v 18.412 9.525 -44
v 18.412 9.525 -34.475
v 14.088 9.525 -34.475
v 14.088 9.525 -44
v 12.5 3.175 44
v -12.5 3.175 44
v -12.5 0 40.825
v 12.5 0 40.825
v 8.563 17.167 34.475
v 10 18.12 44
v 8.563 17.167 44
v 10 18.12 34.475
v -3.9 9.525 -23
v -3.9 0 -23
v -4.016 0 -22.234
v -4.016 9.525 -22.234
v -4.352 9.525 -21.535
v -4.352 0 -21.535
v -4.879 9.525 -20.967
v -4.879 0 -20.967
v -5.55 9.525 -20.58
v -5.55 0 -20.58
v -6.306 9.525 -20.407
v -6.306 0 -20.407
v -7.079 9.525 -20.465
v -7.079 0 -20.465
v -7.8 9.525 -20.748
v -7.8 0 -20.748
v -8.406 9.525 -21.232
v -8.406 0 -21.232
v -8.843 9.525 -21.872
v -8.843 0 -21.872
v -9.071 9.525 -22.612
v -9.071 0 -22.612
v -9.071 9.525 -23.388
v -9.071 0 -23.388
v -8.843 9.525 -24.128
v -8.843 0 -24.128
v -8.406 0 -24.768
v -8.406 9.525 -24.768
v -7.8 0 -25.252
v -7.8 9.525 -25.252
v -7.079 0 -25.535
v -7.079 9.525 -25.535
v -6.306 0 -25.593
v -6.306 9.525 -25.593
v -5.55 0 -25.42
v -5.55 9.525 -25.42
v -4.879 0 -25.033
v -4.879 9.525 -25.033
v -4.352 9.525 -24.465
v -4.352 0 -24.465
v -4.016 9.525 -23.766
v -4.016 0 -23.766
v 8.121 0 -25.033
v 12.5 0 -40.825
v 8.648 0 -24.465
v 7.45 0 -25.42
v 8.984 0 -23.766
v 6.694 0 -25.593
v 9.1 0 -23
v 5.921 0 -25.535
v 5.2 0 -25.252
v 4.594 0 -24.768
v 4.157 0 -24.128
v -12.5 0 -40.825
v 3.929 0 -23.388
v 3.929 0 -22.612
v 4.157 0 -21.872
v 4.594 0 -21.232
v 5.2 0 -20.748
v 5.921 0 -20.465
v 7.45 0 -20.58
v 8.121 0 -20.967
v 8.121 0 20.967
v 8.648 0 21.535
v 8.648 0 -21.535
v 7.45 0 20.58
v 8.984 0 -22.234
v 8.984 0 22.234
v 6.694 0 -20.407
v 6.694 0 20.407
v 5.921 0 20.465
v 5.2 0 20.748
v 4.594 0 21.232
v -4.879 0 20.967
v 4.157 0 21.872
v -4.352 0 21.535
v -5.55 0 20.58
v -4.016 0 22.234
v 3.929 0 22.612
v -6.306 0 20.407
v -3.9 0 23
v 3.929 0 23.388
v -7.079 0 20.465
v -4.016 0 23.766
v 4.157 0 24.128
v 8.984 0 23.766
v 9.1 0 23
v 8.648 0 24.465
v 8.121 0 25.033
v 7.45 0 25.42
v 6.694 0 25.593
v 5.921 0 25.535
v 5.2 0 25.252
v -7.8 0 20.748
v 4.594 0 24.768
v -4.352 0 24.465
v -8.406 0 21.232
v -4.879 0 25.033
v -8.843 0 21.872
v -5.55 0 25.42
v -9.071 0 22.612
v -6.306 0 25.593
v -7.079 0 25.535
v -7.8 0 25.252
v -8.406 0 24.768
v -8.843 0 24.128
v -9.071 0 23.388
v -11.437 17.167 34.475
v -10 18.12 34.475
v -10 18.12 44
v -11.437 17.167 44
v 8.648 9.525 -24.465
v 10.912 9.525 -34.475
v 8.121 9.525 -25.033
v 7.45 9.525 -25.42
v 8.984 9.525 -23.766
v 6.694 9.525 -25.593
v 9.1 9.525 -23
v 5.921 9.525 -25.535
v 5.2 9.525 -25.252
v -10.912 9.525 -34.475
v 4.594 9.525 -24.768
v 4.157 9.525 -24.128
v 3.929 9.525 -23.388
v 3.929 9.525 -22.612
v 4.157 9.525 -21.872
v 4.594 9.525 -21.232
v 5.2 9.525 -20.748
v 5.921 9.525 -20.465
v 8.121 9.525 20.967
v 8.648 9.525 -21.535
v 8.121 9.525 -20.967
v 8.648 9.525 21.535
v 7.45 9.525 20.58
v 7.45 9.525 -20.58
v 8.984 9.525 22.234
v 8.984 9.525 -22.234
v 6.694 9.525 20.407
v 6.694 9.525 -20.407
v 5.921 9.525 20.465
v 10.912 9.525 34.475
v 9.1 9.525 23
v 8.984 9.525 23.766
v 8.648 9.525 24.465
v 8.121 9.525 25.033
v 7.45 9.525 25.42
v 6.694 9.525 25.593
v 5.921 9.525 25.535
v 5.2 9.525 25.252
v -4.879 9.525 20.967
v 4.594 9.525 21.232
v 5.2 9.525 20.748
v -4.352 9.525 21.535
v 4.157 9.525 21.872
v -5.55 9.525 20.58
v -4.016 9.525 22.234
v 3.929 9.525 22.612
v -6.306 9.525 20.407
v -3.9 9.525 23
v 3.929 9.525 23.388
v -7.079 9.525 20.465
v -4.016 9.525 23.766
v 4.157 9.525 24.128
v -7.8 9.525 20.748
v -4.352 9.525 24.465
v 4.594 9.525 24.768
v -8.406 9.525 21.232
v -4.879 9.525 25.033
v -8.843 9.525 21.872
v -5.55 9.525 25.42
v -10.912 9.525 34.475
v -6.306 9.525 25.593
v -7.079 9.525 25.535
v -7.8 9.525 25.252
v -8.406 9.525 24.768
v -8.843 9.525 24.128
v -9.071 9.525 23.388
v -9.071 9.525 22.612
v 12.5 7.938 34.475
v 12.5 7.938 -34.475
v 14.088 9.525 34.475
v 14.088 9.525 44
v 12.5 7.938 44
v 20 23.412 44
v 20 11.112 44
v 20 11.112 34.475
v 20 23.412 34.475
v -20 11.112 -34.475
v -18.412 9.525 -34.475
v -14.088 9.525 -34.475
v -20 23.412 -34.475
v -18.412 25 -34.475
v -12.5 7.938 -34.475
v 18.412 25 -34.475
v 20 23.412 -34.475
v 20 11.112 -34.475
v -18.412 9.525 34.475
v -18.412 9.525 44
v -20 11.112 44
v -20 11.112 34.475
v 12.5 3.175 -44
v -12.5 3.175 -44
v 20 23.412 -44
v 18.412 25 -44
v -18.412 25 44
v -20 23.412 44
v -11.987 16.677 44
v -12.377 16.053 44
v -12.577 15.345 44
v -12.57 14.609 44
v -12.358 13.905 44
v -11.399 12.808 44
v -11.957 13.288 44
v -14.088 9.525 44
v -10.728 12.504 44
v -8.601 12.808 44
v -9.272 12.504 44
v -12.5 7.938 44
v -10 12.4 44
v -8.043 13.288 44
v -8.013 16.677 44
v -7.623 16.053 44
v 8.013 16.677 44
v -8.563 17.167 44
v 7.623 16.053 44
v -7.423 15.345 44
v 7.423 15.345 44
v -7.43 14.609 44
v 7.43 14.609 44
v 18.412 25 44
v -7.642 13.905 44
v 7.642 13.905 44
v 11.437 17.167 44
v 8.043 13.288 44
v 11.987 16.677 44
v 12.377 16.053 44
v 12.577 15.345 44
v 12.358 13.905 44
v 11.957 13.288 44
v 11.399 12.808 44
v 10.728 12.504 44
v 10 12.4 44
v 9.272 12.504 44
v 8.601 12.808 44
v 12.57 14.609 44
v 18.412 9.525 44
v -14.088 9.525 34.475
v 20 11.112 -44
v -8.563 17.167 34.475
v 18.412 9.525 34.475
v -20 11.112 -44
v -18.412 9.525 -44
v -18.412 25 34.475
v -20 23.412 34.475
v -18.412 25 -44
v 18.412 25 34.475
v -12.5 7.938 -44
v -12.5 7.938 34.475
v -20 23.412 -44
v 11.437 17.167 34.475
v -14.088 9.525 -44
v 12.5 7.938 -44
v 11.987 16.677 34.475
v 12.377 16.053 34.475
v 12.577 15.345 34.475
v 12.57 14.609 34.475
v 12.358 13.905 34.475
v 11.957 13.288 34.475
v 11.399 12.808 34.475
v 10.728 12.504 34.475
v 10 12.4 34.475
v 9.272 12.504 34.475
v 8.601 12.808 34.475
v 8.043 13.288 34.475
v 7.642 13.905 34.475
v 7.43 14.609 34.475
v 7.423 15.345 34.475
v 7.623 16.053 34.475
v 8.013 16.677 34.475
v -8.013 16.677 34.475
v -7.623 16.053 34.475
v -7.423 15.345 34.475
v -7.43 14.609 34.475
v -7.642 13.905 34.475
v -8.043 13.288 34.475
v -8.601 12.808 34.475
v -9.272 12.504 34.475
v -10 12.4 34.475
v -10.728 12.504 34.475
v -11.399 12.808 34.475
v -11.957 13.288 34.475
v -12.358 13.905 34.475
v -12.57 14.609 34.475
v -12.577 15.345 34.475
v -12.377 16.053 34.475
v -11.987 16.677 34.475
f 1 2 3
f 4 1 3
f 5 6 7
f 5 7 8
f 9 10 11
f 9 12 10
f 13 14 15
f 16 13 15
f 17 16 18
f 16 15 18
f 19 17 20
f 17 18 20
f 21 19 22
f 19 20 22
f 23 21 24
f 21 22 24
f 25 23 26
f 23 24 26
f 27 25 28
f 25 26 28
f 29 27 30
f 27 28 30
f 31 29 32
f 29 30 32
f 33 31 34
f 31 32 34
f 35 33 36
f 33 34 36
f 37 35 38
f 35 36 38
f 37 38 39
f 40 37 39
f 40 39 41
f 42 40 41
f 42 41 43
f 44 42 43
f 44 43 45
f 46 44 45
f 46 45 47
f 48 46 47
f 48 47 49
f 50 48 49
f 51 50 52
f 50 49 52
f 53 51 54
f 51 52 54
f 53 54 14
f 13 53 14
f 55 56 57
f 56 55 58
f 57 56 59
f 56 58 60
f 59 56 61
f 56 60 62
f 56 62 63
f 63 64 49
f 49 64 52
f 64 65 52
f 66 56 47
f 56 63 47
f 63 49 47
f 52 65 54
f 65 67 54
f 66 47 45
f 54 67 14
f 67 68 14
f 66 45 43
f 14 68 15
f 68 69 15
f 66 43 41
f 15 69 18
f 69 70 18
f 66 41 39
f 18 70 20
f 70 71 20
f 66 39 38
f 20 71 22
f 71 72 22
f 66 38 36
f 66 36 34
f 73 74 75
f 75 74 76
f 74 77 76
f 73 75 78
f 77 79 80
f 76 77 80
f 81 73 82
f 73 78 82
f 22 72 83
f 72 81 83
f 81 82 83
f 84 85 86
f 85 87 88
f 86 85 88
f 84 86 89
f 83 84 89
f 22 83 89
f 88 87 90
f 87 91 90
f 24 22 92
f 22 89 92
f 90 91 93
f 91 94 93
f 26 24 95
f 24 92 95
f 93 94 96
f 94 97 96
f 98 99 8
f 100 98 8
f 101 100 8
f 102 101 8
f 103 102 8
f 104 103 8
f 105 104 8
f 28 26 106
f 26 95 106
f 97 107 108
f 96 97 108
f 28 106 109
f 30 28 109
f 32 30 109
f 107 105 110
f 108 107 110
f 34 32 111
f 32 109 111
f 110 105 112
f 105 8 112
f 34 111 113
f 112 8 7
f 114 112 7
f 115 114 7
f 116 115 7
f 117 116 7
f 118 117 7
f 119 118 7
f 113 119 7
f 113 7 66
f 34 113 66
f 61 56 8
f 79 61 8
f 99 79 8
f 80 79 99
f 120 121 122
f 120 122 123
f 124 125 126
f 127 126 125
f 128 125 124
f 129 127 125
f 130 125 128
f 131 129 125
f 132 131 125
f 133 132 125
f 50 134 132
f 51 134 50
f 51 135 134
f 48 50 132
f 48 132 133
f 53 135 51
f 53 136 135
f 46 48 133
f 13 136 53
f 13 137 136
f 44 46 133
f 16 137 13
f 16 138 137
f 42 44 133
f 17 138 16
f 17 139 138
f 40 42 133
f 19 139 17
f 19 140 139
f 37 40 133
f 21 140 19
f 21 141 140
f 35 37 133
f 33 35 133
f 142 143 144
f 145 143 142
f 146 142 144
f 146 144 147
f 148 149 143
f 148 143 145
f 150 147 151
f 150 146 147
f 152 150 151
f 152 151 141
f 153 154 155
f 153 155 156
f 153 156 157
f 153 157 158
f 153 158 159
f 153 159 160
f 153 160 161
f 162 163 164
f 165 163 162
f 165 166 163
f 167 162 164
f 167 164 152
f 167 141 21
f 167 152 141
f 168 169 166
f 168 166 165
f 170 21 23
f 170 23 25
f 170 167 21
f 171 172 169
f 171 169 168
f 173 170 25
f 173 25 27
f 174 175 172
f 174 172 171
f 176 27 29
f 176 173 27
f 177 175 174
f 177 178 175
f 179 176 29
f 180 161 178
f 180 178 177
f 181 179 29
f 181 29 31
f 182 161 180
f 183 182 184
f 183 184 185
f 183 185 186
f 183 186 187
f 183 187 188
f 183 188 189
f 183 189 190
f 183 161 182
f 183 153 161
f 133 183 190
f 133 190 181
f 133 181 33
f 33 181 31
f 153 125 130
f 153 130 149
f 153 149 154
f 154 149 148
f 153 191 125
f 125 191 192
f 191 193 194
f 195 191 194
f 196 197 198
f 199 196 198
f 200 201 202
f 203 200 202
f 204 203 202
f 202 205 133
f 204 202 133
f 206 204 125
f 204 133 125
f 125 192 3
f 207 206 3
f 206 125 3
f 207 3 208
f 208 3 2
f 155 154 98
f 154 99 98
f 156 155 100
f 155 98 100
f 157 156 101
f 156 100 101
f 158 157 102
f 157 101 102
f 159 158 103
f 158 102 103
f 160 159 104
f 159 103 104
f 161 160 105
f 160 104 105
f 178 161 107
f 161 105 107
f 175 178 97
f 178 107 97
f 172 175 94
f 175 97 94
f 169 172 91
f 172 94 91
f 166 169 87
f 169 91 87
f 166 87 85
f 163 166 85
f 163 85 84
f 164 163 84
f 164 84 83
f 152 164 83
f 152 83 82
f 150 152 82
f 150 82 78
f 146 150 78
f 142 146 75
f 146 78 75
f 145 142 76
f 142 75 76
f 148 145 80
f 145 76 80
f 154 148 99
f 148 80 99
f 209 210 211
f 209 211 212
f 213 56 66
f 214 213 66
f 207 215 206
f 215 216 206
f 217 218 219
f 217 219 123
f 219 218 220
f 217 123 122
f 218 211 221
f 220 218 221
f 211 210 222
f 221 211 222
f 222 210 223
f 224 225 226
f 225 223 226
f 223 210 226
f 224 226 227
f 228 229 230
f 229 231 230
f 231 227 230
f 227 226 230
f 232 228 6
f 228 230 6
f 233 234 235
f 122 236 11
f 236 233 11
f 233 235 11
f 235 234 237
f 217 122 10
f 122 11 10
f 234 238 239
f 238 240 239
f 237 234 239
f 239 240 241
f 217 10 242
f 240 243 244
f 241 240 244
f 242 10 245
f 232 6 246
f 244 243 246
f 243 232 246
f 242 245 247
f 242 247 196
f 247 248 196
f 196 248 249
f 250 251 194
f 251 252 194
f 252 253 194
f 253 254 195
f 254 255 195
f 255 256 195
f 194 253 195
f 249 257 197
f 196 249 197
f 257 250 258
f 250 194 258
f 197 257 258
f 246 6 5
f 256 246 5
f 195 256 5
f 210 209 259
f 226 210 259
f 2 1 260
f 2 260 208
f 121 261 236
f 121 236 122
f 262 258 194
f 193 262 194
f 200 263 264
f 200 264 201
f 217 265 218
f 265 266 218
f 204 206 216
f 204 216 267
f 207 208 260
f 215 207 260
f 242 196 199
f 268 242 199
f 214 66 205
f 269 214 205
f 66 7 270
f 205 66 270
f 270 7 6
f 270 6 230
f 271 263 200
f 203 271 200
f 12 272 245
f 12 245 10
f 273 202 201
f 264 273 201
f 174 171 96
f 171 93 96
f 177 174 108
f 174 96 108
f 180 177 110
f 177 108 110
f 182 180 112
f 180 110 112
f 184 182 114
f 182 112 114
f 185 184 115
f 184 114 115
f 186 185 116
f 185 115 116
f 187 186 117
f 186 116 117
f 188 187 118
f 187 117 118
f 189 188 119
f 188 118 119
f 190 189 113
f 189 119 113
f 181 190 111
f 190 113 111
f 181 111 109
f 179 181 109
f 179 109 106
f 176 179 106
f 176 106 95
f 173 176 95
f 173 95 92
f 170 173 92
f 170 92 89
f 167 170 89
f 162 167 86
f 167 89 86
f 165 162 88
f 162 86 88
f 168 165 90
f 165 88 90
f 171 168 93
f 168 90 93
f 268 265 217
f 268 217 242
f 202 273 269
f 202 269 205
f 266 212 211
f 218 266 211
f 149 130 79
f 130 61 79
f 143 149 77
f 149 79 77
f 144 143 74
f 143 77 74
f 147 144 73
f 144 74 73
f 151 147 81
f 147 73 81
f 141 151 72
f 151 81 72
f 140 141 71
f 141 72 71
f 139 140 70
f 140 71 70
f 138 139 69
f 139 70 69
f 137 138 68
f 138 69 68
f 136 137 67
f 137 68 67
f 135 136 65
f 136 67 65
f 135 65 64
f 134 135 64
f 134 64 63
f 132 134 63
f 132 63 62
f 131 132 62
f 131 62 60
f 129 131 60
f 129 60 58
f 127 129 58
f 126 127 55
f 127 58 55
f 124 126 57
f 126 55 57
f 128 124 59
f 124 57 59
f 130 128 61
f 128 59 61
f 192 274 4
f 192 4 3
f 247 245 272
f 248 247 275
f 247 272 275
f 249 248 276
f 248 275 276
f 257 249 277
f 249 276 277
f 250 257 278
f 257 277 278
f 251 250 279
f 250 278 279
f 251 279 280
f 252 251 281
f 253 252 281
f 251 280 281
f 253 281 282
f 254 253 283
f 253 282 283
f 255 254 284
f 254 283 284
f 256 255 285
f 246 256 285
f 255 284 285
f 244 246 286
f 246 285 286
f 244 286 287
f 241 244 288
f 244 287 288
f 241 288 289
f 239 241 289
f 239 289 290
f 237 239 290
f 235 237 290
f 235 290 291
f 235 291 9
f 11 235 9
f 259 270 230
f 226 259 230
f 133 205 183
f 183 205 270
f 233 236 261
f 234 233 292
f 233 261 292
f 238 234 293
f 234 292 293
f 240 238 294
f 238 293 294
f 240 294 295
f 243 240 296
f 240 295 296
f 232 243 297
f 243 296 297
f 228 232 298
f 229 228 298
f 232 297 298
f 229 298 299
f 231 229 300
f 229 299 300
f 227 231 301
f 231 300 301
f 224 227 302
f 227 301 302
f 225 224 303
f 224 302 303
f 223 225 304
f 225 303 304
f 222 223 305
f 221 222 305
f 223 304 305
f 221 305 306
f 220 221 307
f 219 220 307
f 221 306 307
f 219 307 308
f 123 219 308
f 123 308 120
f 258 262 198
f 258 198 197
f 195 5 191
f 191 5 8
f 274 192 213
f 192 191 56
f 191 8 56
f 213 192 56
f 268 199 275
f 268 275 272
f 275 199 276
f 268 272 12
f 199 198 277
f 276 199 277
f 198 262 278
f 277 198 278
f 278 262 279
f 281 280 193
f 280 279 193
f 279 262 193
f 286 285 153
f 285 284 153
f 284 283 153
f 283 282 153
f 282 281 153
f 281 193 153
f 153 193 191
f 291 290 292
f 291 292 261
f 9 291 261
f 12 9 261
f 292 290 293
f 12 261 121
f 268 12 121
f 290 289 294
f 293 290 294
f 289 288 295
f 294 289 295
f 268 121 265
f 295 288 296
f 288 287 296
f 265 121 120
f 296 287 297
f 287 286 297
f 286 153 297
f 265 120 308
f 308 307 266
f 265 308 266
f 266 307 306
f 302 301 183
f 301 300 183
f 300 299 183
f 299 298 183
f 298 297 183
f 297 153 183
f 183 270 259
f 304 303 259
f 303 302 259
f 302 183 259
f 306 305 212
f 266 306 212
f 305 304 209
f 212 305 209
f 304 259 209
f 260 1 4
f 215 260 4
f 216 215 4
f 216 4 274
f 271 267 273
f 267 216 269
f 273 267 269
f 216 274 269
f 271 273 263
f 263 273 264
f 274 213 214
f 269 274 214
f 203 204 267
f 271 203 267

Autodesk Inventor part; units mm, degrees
ref_plane "YZ Plane" through (0, 0, 0) normal (1, 0, 0) x (0, 1, 0)
ref_plane "XZ Plane" through (0, 0, 0) normal (0, 1, 0) x (-1, 0, 0)
sketch "Sketch1" plane through (0, 0, 0) normal (0, 1, 0) x (-1, 0, 0)
  line L0 (-12.5, -44) -> (12.5, -44)
  line L1 (12.5, -44) -> (12.5, 44)
  line L2 (12.5, 44) -> (-12.5, 44)
  line L3 (-12.5, 44) -> (-12.5, -44)
  line L4 (-12.5, -44) -> (12.5, 44) construction
  line L5 (12.5, -44) -> (-12.5, 44) construction
  point P0 (0, 0)
  dimension "d0" = 88
  dimension "d1" = 25
extrude "Extrusion1" add sketch "Sketch1" along normal blind 9.525
sketch "Sketch2" plane through (0, 9.525, 0) normal (0, 1, 0) x (1, 0, 0)
  line L0 (20, -34.475) -> (-20, -34.475)
  line L1 (-20, -34.475) -> (-20, -44)
  line L2 (-20, -44) -> (20, -44)
  line L3 (20, -44) -> (20, -34.475)
  line L4 (20, -34.475) -> (-20, -44) construction
  line L5 (-20, -34.475) -> (20, -44) construction
  line L6 (-12.5, -44) -> (12.5, -44) projected
  point P0 (0, 0)
  point P1 (0, -39.2375)
  dimension "d4" = 40
  dimension "d5" = 9.525
extrude "Extrusion2" add sketch "Sketch2" along normal blind 15.475
fillet "Fillet1" radius 3.175 6 edges at (-12.5, 9.525, 39.2375) (-20, 9.525, 39.2375) (-20, 25, 39.2375) (20, 9.525, 39.2375) (20, 25, 39.2375) (12.5, 9.525, 39.2375)
ref_plane "Work Plane1" through (-16.825, 25, 0) normal (0, 0, 1) x (1, 0, 0)
mirror "Mirror1" about plane through (-16.825, 25, 0) normal (0, 0, 1) of "Extrusion2", "Fillet1"
sketch "Sketch3" plane through (16.825, 25, -44) normal (0, 0, -1) x (-1, 0, 0)
  line L0 (29.325, -25) -> (29.325, -18.65) projected
  arc A0 (32.5, -15.475) -> (29.325, -18.65) centre (32.5, -18.65) ccw projected
  line L1 (33.65, -15.475) -> (32.5, -15.475) projected
  arc A1 (33.65, -15.475) -> (36.825, -12.3) centre (33.65, -12.3) ccw projected
  line L2 (36.825, -12.3) -> (36.825, -3.175) projected
  arc A2 (36.825, -3.175) -> (33.65, 0) centre (33.65, -3.175) ccw projected
  line L3 (33.65, 0) -> (0, 0) projected
  arc A3 (0, 0) -> (-3.175, -3.175) centre (0, -3.175) ccw projected
  line L4 (-3.175, -12.3) -> (-3.175, -3.175) projected
  arc A4 (-3.175, -12.3) -> (0, -15.475) centre (0, -12.3) ccw projected
  line L5 (1.15, -15.475) -> (0, -15.475) projected
  arc A5 (4.325, -18.65) -> (1.15, -15.475) centre (1.15, -18.65) ccw projected
  line L6 (4.325, -25) -> (4.325, -18.65) projected
  circle A6 centre (26.825, -10) radius 2.6
  circle A7 centre (6.825, -10) radius 2.6
  line L7 (4.325, -25) -> (29.325, -25) projected
  point P0 (16.825, -25)
  dimension "d10" = 5.2
  dimension "d11" = 10
  dimension "d12" = 10
  dimension "d13" = 10
extrude "Extrusion3" cut sketch "Sketch3" against normal through all contours A6 | A7
sketch "Sketch4" plane through (0, 0, 0) normal (0, -1, 0) x (1, 0, 0)
  line L0 (-6.5, -23) -> (6.5, -23) construction
  line L1 (6.5, -23) -> (6.5, 23) construction
  line L2 (6.5, 23) -> (-6.5, 23) construction
  line L3 (-6.5, 23) -> (-6.5, -23) construction
  line L4 (-6.5, -23) -> (6.5, 23) construction
  line L5 (6.5, -23) -> (-6.5, 23) construction
  circle A0 centre (6.5, 23) radius 2.6
  circle A1 centre (6.5, -23) radius 2.6
  circle A2 centre (-6.5, -23) radius 2.6
  circle A3 centre (-6.5, 23) radius 2.6
  point P0 (0, 0)
  dimension "d16" = 5.2
  dimension "d17" = 46
  dimension "d18" = 13
extrude "Extrusion4" cut sketch "Sketch4" against normal through all
sketch "Sketch5" plane through (16.825, 25, -44) normal (0, 0, -1) x (-1, 0, 0)
  circle A0 centre (6.825, -10) radius 2.6 projected
  circle A1 centre (26.825, -10) radius 2.6 projected
  line L0 (5.3878, -7.8333) -> (6.825, -6.88)
  line L1 (6.825, -6.88) -> (8.2622, -7.8333)
  line L2 (25.3878, -7.8333) -> (26.825, -6.88)
  line L3 (26.825, -6.88) -> (28.2622, -7.8333)
  point P0 (16.825, -25)
  point P1 (6.825, -7.4)
  point P2 (26.825, -7.4)
  dimension "d21" = 0.52
  dimension "d22" = 5.2
  dimension "d23" = 0.52
extrude "Extrusion5" cut sketch "Sketch5" against normal through all contours A0 L0 L1 | A1 L2 L3
sketch "Sketch6" plane through (0, 9.525, 0) normal (0, 1, 0) x (1, 0, 0)
  circle A0 centre (-6.5, 23) radius 2.6 projected
  circle A1 centre (6.5, 23) radius 2.6 projected
  circle A2 centre (-6.5, -23) radius 2.6 projected
  circle A3 centre (6.5, -23) radius 2.6 projected
  circle A4 centre (-6.5, 23) radius 5
  circle A5 centre (6.5, 23) radius 5
  circle A6 centre (-6.5, -23) radius 5
  circle A7 centre (6.5, -23) radius 5
  point P0 (0, 0)
  dimension "d26" = 10
extrude "Extrusion6" add sketch "Sketch6" against normal up to surface (9.525 mm away)
chamfer "Chamfer1" distance 3.175 angle 45 2 edges at (0, 0, -44) (0, 0, 44)
sketch "Sketch7" plane through (-16.825, 25, 44) normal (0, 0, 1) x (1, 0, 0)
  line L0 (29.325, -21.825) -> (4.325, -21.825) projected
  line L1 (29.325, -21.825) -> (29.325, -18.65) projected
  arc A0 (32.5, -15.475) -> (29.325, -18.65) centre (32.5, -18.65) ccw projected
  line L2 (32.5, -15.475) -> (33.65, -15.475) projected
  arc A1 (33.65, -15.475) -> (36.825, -12.3) centre (33.65, -12.3) ccw projected
  line L3 (36.825, -12.3) -> (36.825, -3.175) projected
  arc A2 (36.825, -3.175) -> (33.65, 0) centre (33.65, -3.175) ccw projected
  line L4 (0, 0) -> (33.65, 0) projected
  arc A3 (0, 0) -> (-3.175, -3.175) centre (0, -3.175) ccw projected
  line L5 (-3.175, -12.3) -> (-3.175, -3.175) projected
  arc A4 (-3.175, -12.3) -> (0, -15.475) centre (0, -12.3) ccw projected
  line L6 (0, -15.475) -> (1.15, -15.475) projected
  arc A5 (4.325, -18.65) -> (1.15, -15.475) centre (1.15, -18.65) ccw projected
  line L7 (4.325, -21.825) -> (4.325, -18.65) projected
  line L8 (5.3878, -7.8333) -> (6.825, -6.88) projected
  line L9 (6.825, -6.88) -> (8.2622, -7.8333) projected
  arc A6 (5.3878, -7.8333) -> (8.2622, -7.8333) centre (6.825, -10) ccw projected
  line L10 (25.3878, -7.8333) -> (26.825, -6.88) projected
  line L11 (26.825, -6.88) -> (28.2622, -7.8333) projected
  arc A7 (25.3878, -7.8333) -> (28.2622, -7.8333) centre (26.825, -10) ccw projected
  line L12 (-3.175, 0) -> (36.825, 0)
  line L13 (36.825, 0) -> (36.825, -15.475)
  line L14 (36.825, -15.475) -> (-3.175, -15.475)
  line L15 (-3.175, -15.475) -> (-3.175, 0)
  line L16 (0, 0) -> (33.65, 0) projected
  line L17 (36.825, -12.3) -> (36.825, -3.175) projected
  line L18 (32.5, -15.475) -> (33.65, -15.475) projected
  line L19 (-3.175, -12.3) -> (-3.175, -3.175) projected
  line L20 (29.325, -18.65) -> (29.325, -15.475)
  line L21 (4.325, -18.65) -> (4.325, -15.475)
  point P0 (16.825, -25)
  point P1 (0, -15.475)
extrude "Extrusion7" add sketch "Sketch7" against normal up to surface (9.525 mm away) contours A1 L13 L14 | L14 L15 A4 | A2 L12 L13 | L15 L12 A3
extrude "Extrusion8" cut sketch "Sketch7" against normal through all contours L20 L14 A0 | A5 L14 L21
sketch "Sketch8" plane through (20, 25, 34.475) normal (0, 0, -1) x (-1, 0, 0)
  line L0 (7.5, -15.475) -> (7.5, -18.65) projected
  arc A0 (10.675, -15.475) -> (7.5, -18.65) centre (10.675, -18.65) ccw projected
  line L1 (29.325, -15.475) -> (10.675, -15.475) projected
  arc A1 (32.5, -18.65) -> (29.325, -15.475) centre (29.325, -18.65) ccw projected
  line L2 (32.5, -18.65) -> (32.5, -15.475) projected
  line L3 (40, -15.475) -> (32.5, -15.475) projected
  line L4 (40, 0) -> (40, -15.475) projected
  line L5 (0, 0) -> (40, 0) projected
  line L6 (0, -15.475) -> (0, 0) projected
  line L7 (0, -15.475) -> (7.5, -15.475) projected
  line L8 (8.5628, -7.8333) -> (10, -6.88) projected
  line L9 (10, -6.88) -> (11.4372, -7.8333) projected
  arc A2 (8.5628, -7.8333) -> (11.4372, -7.8333) centre (10, -10) ccw projected
  line L10 (28.5628, -7.8333) -> (30, -6.88) projected
  line L11 (30, -6.88) -> (31.4372, -7.8333) projected
  arc A3 (28.5628, -7.8333) -> (31.4372, -7.8333) centre (30, -10) ccw projected
  line L12 (7.5, -15.475) -> (32.5, -15.475)
  point P0 (20, -25)
  point P1 (10.675, -15.475)
extrude "Extrusion9" add sketch "Sketch8" along normal up to surface (68.95 mm away) contours L12 A0 L0 | L12 L2 A1
mirror "Mirror2" about plane through (-16.825, 25, 0) normal (0, 0, 1) of "Extrusion2"
chamfer "Chamfer2" distance 1.5875 angle 45 14 edges at (20, 25, 39.2375) (20, 9.525, 39.2375) (-20, 25, 39.2375) (-20, 9.525, 39.2375) (-12.5, 9.525, 39.2375) (-12.5, 9.525, -39.2375) (-20, 9.525, -39.2375) (-20, 25, -39.2375) (12.5, 9.525, -39.2375) (12.5, 9.525, 39.2375) (20, 25, -39.2375) (20, 9.525, -39.2375) (-12.5, 9.525, 0) (12.5, 9.525, 0)
equation "\"d12\" = d11"
equation "\"d13\" = d12"
equation "\"d21\" = 0.1 * d22"
equation "\"d23\" = d21"
properties part number "CNC-023-YAxisBallScrewStabilizerMount" material "ABS Plastic"
